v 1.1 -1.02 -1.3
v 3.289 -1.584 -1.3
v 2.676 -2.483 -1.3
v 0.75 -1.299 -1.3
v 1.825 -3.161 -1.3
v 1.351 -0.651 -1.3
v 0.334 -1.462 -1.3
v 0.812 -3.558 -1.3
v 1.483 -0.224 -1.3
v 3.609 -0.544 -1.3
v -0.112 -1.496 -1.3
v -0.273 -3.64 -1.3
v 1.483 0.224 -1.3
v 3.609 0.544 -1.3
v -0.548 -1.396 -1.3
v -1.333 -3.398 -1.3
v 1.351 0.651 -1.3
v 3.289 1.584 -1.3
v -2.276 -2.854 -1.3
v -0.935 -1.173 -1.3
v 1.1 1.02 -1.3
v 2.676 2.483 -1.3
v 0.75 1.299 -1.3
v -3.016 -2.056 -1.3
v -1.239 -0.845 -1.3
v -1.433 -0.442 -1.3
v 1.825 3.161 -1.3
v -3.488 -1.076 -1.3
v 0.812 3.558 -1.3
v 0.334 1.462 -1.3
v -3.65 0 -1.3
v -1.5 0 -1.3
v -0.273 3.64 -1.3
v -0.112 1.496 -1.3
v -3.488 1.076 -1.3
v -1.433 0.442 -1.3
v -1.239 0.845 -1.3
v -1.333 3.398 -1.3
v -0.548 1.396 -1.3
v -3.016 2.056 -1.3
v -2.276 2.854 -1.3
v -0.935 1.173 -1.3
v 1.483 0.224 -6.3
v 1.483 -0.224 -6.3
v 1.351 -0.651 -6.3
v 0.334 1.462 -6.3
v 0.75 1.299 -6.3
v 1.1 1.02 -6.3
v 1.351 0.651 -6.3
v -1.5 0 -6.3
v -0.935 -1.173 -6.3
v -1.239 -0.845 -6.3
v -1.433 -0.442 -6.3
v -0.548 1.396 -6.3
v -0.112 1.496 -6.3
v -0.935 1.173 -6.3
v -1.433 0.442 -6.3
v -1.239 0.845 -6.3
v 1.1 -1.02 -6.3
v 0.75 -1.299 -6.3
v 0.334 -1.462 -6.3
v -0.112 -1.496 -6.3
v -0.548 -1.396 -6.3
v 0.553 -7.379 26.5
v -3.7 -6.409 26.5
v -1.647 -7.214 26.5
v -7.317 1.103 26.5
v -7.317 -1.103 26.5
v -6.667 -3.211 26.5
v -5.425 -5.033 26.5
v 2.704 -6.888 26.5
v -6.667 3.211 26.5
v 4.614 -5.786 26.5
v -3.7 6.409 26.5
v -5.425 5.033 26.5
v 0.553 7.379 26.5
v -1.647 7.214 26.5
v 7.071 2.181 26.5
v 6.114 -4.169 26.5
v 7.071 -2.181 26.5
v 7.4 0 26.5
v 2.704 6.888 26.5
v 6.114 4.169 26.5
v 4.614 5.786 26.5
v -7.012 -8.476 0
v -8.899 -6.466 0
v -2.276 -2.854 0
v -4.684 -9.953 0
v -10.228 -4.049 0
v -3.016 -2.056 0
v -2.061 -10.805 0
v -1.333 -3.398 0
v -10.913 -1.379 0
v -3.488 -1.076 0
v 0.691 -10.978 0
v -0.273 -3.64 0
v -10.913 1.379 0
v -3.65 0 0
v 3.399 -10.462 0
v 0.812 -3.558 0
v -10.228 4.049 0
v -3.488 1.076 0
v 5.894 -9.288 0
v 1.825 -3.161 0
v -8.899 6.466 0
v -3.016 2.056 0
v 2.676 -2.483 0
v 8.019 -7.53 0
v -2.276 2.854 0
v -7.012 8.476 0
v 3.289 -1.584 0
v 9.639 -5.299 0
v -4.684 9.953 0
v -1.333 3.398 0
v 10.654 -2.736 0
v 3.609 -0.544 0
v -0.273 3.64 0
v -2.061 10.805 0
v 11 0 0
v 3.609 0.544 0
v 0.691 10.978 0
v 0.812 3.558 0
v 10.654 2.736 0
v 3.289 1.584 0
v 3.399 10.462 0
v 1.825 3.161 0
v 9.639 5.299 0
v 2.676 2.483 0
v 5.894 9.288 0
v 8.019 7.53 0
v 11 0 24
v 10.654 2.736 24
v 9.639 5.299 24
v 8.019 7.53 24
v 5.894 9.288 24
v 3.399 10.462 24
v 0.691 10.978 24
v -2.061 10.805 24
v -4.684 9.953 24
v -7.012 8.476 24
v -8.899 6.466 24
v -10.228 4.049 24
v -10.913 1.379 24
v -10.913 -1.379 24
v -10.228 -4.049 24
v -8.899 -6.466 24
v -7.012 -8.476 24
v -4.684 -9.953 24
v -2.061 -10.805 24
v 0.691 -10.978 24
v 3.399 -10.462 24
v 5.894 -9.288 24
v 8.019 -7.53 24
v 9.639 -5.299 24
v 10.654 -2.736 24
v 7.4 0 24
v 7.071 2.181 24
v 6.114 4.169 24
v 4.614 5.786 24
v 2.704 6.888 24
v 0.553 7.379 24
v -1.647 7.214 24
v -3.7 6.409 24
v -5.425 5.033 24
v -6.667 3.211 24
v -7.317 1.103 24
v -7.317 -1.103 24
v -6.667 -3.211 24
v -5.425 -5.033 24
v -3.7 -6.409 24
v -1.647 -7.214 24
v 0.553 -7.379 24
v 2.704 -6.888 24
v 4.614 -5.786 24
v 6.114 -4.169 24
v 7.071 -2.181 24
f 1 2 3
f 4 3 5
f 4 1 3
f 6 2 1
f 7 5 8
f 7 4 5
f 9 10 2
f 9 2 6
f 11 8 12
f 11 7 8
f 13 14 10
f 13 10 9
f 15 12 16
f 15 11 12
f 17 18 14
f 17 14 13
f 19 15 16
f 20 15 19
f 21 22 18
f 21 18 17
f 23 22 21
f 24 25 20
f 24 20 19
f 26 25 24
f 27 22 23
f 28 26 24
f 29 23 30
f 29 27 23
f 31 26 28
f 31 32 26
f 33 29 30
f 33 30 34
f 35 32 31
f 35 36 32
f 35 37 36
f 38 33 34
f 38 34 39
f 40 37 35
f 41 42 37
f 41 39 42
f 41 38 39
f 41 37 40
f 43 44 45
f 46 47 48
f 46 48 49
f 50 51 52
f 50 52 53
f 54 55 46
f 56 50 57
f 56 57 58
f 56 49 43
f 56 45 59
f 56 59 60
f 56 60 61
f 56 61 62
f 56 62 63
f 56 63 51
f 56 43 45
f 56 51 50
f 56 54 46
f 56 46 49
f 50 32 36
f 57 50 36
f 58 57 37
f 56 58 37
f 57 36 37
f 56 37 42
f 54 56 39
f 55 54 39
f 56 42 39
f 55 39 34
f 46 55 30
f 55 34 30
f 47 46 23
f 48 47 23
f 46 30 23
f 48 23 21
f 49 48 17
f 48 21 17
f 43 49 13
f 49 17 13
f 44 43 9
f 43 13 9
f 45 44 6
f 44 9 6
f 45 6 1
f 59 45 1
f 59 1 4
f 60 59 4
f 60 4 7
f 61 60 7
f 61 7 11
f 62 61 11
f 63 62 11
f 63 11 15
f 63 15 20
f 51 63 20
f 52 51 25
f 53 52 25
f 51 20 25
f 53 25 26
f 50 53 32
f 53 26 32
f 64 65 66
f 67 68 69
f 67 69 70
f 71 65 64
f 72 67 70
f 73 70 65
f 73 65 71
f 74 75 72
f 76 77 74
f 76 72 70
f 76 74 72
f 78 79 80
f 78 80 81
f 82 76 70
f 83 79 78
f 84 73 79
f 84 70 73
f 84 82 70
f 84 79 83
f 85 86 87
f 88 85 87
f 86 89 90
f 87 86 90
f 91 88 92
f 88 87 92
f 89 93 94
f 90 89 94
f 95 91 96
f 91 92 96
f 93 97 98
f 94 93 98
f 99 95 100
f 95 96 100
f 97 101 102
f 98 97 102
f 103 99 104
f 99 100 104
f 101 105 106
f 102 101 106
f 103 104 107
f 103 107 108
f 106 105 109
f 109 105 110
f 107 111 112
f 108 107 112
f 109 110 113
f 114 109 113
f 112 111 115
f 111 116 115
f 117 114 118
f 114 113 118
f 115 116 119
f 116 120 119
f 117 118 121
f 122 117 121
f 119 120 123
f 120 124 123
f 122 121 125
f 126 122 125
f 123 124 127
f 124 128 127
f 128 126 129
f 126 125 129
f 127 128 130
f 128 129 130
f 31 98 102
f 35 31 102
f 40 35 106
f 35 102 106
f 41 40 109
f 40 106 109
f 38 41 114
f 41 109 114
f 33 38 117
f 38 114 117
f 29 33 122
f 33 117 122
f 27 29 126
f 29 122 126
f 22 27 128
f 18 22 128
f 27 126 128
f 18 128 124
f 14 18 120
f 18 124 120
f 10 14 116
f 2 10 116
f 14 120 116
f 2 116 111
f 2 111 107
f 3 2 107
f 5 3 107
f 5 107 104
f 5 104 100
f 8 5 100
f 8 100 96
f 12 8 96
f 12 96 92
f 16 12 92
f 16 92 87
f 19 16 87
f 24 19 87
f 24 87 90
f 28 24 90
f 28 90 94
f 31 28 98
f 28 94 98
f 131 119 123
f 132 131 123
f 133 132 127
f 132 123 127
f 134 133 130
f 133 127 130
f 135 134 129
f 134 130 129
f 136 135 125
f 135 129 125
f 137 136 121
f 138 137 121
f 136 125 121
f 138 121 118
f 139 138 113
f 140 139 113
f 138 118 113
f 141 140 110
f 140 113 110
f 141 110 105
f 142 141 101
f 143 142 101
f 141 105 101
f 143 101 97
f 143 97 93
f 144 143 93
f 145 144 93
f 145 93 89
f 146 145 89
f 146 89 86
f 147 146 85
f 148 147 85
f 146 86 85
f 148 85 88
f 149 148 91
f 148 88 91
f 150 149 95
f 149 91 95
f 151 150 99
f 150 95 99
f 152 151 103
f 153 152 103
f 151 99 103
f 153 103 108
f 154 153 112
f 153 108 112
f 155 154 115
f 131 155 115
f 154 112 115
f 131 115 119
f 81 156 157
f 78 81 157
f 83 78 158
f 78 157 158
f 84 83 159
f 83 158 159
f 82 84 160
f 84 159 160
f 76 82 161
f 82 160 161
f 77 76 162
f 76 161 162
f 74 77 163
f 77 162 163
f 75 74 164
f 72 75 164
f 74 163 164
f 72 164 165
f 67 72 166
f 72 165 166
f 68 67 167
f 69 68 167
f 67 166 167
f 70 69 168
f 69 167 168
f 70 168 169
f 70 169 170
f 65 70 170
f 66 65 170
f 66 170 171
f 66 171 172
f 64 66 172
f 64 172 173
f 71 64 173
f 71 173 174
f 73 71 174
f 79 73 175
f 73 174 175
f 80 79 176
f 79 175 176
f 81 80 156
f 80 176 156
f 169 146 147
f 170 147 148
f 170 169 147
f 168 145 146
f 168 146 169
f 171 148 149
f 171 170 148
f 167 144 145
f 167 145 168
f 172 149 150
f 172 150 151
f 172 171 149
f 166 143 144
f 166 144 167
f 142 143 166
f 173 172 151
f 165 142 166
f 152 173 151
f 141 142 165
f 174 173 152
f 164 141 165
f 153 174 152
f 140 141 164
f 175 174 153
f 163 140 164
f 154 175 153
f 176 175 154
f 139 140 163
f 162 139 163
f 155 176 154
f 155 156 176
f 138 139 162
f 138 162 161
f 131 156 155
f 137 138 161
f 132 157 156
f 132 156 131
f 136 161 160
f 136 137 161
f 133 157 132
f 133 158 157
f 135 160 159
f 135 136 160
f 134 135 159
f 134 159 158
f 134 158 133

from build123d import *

# Parameters (mm, degrees)
SKETCH1_R      = 11
EXTRUDE1_DEPTH = 24
SKETCH2_R      = 7.4
EXTRUDE3_DEPTH = 2.5
SKETCH3_R      = 3.65
EXTRUDE4_DEPTH = 1.3
SKETCH4_R      = 1.5
EXTRUDE5_DEPTH = 5


with BuildPart() as part:
    # Sketch1 → Extrude1 (new body)
    with BuildSketch(Plane.XY):
        Circle(SKETCH1_R)
    extrude(amount=EXTRUDE1_DEPTH)

    # Sketch2 → Extrude3 (add)
    with BuildSketch(Plane.XY.offset(24)):
        Circle(SKETCH2_R)
    extrude(amount=EXTRUDE3_DEPTH)

    # Sketch3 → Extrude4 (add)
    with BuildSketch(Plane(origin=(0, 0, 0), x_dir=(-1, 0, 0), z_dir=(0, 0, -1))):
        Circle(SKETCH3_R)
    extrude(amount=EXTRUDE4_DEPTH)

    # Sketch4 → Extrude5 (add)
    with BuildSketch(Plane(origin=(0, 0, -1.3), x_dir=(-1, 0, 0), z_dir=(0, 0, -1))):
        Circle(SKETCH4_R)
    extrude(amount=EXTRUDE5_DEPTH)


solid = part.part
